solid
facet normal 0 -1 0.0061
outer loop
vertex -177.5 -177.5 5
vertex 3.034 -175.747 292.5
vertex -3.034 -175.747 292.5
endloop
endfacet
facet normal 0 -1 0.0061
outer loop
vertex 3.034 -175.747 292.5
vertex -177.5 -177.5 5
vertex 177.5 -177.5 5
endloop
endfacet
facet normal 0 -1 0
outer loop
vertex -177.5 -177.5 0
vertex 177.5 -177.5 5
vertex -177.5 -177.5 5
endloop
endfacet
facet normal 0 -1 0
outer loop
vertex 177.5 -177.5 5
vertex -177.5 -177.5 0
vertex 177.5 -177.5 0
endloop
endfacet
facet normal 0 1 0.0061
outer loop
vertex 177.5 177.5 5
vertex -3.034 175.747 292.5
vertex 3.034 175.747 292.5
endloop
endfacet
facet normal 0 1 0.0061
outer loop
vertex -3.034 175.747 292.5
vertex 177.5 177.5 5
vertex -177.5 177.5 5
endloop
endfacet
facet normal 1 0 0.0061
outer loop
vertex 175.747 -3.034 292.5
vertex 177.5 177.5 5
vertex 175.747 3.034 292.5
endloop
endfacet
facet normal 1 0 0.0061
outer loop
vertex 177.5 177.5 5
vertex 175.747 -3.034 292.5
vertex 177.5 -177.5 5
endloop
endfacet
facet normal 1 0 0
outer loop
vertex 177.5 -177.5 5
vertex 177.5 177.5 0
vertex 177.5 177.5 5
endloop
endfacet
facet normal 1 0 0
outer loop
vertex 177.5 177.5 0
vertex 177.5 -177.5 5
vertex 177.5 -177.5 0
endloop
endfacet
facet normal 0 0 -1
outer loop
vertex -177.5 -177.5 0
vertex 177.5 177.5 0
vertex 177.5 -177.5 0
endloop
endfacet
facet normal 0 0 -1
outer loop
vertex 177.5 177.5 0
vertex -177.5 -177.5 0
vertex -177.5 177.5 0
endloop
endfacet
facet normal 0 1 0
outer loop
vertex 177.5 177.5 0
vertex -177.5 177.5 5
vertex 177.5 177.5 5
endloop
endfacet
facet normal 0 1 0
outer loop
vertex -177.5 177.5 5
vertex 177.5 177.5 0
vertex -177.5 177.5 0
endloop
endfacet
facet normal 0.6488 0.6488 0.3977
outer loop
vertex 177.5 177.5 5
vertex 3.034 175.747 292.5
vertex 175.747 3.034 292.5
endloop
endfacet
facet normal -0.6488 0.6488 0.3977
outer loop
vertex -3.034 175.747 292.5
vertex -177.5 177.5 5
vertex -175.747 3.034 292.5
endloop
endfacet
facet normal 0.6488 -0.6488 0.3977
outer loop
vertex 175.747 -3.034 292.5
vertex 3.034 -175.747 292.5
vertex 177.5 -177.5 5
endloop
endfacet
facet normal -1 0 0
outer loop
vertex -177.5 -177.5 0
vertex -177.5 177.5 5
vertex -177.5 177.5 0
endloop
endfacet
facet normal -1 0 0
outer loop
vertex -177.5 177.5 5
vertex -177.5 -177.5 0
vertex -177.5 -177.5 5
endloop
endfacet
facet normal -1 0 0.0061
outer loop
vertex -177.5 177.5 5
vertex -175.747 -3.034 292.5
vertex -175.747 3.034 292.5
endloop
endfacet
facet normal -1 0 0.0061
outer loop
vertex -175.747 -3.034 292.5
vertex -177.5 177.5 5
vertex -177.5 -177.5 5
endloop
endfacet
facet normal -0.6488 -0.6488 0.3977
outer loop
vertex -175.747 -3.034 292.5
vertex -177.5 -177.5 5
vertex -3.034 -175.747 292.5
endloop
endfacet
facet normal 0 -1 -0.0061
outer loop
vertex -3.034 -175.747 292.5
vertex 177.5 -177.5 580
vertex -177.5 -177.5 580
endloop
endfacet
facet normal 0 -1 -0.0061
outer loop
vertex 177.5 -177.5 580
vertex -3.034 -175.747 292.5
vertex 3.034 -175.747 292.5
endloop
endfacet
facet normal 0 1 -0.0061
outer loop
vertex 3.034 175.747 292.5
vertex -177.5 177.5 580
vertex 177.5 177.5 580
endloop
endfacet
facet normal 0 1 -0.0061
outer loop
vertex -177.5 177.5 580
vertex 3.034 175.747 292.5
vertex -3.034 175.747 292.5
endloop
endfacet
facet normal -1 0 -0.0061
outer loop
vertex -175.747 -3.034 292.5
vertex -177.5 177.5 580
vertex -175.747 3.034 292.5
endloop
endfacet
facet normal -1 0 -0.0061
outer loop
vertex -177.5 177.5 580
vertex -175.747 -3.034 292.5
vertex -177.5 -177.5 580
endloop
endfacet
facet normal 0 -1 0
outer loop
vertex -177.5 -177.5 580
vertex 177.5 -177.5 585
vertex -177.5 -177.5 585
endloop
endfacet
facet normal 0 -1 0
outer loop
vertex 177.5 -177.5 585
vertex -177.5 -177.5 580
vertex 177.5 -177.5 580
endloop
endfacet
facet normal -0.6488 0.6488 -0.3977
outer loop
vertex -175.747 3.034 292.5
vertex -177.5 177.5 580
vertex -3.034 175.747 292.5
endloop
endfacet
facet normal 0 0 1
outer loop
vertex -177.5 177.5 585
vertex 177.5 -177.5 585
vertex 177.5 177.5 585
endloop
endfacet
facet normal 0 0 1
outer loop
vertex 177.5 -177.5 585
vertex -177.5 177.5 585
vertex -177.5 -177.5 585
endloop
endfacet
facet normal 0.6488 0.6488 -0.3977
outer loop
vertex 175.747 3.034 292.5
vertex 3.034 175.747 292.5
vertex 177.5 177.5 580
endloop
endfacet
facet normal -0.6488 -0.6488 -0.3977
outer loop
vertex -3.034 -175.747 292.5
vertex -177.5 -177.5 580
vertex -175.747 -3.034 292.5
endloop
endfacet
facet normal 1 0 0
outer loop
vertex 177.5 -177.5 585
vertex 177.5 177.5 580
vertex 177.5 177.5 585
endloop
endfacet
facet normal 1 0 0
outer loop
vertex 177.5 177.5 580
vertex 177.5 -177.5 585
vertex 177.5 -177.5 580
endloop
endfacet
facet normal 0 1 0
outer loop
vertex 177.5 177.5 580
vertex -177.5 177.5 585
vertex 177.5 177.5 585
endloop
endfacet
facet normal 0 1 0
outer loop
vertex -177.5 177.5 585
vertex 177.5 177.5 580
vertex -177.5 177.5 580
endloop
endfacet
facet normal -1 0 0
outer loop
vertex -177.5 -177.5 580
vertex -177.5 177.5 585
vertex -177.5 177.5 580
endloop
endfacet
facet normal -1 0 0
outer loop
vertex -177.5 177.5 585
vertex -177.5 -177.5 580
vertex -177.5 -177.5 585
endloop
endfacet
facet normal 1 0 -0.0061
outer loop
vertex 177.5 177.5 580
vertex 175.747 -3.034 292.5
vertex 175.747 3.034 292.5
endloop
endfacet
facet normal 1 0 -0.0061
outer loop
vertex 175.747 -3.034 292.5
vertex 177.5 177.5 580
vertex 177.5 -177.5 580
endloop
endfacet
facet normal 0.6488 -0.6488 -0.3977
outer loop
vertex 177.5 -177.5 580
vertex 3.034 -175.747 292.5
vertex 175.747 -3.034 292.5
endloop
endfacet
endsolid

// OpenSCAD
dim_width = 355;
dim_height = 585;
dim_thickness = 5;


module equilateral(w,h,t){
	linear_extrude(height = t, center = true, convexity = 10, twist = 0)
	polygon(points=[[w * -0.5,0],[w * 0.5,0],[0,h]], paths=[[0,1,2]]);	
}

module top(){
	translate([ 0, 0, dim_thickness * 0.5])cube([dim_width, dim_width, dim_thickness], center = true);
}


hull(){
top();
rotate([ 0, 0, 45])translate([0, 0, dim_height * 0.5])scale([0.7,0.7,1])top();
}

translate([0,0,dim_height])mirror([ 0, 0, -1])
hull(){
top();
rotate([ 0, 0, 45])translate([0, 0, dim_height * 0.5])scale([0.7,0.7,1])top();
}

//for(i = [0:90:360])rotate([0,0,i])
//translate([ 0, dim_width * 0.5 - dim_thickness * 0.5, 0])rotate([ 90, 0, 0])equilateral( dim_width, dim_height * 0.5, dim_thickness);
//equilateral(50,50,5);
